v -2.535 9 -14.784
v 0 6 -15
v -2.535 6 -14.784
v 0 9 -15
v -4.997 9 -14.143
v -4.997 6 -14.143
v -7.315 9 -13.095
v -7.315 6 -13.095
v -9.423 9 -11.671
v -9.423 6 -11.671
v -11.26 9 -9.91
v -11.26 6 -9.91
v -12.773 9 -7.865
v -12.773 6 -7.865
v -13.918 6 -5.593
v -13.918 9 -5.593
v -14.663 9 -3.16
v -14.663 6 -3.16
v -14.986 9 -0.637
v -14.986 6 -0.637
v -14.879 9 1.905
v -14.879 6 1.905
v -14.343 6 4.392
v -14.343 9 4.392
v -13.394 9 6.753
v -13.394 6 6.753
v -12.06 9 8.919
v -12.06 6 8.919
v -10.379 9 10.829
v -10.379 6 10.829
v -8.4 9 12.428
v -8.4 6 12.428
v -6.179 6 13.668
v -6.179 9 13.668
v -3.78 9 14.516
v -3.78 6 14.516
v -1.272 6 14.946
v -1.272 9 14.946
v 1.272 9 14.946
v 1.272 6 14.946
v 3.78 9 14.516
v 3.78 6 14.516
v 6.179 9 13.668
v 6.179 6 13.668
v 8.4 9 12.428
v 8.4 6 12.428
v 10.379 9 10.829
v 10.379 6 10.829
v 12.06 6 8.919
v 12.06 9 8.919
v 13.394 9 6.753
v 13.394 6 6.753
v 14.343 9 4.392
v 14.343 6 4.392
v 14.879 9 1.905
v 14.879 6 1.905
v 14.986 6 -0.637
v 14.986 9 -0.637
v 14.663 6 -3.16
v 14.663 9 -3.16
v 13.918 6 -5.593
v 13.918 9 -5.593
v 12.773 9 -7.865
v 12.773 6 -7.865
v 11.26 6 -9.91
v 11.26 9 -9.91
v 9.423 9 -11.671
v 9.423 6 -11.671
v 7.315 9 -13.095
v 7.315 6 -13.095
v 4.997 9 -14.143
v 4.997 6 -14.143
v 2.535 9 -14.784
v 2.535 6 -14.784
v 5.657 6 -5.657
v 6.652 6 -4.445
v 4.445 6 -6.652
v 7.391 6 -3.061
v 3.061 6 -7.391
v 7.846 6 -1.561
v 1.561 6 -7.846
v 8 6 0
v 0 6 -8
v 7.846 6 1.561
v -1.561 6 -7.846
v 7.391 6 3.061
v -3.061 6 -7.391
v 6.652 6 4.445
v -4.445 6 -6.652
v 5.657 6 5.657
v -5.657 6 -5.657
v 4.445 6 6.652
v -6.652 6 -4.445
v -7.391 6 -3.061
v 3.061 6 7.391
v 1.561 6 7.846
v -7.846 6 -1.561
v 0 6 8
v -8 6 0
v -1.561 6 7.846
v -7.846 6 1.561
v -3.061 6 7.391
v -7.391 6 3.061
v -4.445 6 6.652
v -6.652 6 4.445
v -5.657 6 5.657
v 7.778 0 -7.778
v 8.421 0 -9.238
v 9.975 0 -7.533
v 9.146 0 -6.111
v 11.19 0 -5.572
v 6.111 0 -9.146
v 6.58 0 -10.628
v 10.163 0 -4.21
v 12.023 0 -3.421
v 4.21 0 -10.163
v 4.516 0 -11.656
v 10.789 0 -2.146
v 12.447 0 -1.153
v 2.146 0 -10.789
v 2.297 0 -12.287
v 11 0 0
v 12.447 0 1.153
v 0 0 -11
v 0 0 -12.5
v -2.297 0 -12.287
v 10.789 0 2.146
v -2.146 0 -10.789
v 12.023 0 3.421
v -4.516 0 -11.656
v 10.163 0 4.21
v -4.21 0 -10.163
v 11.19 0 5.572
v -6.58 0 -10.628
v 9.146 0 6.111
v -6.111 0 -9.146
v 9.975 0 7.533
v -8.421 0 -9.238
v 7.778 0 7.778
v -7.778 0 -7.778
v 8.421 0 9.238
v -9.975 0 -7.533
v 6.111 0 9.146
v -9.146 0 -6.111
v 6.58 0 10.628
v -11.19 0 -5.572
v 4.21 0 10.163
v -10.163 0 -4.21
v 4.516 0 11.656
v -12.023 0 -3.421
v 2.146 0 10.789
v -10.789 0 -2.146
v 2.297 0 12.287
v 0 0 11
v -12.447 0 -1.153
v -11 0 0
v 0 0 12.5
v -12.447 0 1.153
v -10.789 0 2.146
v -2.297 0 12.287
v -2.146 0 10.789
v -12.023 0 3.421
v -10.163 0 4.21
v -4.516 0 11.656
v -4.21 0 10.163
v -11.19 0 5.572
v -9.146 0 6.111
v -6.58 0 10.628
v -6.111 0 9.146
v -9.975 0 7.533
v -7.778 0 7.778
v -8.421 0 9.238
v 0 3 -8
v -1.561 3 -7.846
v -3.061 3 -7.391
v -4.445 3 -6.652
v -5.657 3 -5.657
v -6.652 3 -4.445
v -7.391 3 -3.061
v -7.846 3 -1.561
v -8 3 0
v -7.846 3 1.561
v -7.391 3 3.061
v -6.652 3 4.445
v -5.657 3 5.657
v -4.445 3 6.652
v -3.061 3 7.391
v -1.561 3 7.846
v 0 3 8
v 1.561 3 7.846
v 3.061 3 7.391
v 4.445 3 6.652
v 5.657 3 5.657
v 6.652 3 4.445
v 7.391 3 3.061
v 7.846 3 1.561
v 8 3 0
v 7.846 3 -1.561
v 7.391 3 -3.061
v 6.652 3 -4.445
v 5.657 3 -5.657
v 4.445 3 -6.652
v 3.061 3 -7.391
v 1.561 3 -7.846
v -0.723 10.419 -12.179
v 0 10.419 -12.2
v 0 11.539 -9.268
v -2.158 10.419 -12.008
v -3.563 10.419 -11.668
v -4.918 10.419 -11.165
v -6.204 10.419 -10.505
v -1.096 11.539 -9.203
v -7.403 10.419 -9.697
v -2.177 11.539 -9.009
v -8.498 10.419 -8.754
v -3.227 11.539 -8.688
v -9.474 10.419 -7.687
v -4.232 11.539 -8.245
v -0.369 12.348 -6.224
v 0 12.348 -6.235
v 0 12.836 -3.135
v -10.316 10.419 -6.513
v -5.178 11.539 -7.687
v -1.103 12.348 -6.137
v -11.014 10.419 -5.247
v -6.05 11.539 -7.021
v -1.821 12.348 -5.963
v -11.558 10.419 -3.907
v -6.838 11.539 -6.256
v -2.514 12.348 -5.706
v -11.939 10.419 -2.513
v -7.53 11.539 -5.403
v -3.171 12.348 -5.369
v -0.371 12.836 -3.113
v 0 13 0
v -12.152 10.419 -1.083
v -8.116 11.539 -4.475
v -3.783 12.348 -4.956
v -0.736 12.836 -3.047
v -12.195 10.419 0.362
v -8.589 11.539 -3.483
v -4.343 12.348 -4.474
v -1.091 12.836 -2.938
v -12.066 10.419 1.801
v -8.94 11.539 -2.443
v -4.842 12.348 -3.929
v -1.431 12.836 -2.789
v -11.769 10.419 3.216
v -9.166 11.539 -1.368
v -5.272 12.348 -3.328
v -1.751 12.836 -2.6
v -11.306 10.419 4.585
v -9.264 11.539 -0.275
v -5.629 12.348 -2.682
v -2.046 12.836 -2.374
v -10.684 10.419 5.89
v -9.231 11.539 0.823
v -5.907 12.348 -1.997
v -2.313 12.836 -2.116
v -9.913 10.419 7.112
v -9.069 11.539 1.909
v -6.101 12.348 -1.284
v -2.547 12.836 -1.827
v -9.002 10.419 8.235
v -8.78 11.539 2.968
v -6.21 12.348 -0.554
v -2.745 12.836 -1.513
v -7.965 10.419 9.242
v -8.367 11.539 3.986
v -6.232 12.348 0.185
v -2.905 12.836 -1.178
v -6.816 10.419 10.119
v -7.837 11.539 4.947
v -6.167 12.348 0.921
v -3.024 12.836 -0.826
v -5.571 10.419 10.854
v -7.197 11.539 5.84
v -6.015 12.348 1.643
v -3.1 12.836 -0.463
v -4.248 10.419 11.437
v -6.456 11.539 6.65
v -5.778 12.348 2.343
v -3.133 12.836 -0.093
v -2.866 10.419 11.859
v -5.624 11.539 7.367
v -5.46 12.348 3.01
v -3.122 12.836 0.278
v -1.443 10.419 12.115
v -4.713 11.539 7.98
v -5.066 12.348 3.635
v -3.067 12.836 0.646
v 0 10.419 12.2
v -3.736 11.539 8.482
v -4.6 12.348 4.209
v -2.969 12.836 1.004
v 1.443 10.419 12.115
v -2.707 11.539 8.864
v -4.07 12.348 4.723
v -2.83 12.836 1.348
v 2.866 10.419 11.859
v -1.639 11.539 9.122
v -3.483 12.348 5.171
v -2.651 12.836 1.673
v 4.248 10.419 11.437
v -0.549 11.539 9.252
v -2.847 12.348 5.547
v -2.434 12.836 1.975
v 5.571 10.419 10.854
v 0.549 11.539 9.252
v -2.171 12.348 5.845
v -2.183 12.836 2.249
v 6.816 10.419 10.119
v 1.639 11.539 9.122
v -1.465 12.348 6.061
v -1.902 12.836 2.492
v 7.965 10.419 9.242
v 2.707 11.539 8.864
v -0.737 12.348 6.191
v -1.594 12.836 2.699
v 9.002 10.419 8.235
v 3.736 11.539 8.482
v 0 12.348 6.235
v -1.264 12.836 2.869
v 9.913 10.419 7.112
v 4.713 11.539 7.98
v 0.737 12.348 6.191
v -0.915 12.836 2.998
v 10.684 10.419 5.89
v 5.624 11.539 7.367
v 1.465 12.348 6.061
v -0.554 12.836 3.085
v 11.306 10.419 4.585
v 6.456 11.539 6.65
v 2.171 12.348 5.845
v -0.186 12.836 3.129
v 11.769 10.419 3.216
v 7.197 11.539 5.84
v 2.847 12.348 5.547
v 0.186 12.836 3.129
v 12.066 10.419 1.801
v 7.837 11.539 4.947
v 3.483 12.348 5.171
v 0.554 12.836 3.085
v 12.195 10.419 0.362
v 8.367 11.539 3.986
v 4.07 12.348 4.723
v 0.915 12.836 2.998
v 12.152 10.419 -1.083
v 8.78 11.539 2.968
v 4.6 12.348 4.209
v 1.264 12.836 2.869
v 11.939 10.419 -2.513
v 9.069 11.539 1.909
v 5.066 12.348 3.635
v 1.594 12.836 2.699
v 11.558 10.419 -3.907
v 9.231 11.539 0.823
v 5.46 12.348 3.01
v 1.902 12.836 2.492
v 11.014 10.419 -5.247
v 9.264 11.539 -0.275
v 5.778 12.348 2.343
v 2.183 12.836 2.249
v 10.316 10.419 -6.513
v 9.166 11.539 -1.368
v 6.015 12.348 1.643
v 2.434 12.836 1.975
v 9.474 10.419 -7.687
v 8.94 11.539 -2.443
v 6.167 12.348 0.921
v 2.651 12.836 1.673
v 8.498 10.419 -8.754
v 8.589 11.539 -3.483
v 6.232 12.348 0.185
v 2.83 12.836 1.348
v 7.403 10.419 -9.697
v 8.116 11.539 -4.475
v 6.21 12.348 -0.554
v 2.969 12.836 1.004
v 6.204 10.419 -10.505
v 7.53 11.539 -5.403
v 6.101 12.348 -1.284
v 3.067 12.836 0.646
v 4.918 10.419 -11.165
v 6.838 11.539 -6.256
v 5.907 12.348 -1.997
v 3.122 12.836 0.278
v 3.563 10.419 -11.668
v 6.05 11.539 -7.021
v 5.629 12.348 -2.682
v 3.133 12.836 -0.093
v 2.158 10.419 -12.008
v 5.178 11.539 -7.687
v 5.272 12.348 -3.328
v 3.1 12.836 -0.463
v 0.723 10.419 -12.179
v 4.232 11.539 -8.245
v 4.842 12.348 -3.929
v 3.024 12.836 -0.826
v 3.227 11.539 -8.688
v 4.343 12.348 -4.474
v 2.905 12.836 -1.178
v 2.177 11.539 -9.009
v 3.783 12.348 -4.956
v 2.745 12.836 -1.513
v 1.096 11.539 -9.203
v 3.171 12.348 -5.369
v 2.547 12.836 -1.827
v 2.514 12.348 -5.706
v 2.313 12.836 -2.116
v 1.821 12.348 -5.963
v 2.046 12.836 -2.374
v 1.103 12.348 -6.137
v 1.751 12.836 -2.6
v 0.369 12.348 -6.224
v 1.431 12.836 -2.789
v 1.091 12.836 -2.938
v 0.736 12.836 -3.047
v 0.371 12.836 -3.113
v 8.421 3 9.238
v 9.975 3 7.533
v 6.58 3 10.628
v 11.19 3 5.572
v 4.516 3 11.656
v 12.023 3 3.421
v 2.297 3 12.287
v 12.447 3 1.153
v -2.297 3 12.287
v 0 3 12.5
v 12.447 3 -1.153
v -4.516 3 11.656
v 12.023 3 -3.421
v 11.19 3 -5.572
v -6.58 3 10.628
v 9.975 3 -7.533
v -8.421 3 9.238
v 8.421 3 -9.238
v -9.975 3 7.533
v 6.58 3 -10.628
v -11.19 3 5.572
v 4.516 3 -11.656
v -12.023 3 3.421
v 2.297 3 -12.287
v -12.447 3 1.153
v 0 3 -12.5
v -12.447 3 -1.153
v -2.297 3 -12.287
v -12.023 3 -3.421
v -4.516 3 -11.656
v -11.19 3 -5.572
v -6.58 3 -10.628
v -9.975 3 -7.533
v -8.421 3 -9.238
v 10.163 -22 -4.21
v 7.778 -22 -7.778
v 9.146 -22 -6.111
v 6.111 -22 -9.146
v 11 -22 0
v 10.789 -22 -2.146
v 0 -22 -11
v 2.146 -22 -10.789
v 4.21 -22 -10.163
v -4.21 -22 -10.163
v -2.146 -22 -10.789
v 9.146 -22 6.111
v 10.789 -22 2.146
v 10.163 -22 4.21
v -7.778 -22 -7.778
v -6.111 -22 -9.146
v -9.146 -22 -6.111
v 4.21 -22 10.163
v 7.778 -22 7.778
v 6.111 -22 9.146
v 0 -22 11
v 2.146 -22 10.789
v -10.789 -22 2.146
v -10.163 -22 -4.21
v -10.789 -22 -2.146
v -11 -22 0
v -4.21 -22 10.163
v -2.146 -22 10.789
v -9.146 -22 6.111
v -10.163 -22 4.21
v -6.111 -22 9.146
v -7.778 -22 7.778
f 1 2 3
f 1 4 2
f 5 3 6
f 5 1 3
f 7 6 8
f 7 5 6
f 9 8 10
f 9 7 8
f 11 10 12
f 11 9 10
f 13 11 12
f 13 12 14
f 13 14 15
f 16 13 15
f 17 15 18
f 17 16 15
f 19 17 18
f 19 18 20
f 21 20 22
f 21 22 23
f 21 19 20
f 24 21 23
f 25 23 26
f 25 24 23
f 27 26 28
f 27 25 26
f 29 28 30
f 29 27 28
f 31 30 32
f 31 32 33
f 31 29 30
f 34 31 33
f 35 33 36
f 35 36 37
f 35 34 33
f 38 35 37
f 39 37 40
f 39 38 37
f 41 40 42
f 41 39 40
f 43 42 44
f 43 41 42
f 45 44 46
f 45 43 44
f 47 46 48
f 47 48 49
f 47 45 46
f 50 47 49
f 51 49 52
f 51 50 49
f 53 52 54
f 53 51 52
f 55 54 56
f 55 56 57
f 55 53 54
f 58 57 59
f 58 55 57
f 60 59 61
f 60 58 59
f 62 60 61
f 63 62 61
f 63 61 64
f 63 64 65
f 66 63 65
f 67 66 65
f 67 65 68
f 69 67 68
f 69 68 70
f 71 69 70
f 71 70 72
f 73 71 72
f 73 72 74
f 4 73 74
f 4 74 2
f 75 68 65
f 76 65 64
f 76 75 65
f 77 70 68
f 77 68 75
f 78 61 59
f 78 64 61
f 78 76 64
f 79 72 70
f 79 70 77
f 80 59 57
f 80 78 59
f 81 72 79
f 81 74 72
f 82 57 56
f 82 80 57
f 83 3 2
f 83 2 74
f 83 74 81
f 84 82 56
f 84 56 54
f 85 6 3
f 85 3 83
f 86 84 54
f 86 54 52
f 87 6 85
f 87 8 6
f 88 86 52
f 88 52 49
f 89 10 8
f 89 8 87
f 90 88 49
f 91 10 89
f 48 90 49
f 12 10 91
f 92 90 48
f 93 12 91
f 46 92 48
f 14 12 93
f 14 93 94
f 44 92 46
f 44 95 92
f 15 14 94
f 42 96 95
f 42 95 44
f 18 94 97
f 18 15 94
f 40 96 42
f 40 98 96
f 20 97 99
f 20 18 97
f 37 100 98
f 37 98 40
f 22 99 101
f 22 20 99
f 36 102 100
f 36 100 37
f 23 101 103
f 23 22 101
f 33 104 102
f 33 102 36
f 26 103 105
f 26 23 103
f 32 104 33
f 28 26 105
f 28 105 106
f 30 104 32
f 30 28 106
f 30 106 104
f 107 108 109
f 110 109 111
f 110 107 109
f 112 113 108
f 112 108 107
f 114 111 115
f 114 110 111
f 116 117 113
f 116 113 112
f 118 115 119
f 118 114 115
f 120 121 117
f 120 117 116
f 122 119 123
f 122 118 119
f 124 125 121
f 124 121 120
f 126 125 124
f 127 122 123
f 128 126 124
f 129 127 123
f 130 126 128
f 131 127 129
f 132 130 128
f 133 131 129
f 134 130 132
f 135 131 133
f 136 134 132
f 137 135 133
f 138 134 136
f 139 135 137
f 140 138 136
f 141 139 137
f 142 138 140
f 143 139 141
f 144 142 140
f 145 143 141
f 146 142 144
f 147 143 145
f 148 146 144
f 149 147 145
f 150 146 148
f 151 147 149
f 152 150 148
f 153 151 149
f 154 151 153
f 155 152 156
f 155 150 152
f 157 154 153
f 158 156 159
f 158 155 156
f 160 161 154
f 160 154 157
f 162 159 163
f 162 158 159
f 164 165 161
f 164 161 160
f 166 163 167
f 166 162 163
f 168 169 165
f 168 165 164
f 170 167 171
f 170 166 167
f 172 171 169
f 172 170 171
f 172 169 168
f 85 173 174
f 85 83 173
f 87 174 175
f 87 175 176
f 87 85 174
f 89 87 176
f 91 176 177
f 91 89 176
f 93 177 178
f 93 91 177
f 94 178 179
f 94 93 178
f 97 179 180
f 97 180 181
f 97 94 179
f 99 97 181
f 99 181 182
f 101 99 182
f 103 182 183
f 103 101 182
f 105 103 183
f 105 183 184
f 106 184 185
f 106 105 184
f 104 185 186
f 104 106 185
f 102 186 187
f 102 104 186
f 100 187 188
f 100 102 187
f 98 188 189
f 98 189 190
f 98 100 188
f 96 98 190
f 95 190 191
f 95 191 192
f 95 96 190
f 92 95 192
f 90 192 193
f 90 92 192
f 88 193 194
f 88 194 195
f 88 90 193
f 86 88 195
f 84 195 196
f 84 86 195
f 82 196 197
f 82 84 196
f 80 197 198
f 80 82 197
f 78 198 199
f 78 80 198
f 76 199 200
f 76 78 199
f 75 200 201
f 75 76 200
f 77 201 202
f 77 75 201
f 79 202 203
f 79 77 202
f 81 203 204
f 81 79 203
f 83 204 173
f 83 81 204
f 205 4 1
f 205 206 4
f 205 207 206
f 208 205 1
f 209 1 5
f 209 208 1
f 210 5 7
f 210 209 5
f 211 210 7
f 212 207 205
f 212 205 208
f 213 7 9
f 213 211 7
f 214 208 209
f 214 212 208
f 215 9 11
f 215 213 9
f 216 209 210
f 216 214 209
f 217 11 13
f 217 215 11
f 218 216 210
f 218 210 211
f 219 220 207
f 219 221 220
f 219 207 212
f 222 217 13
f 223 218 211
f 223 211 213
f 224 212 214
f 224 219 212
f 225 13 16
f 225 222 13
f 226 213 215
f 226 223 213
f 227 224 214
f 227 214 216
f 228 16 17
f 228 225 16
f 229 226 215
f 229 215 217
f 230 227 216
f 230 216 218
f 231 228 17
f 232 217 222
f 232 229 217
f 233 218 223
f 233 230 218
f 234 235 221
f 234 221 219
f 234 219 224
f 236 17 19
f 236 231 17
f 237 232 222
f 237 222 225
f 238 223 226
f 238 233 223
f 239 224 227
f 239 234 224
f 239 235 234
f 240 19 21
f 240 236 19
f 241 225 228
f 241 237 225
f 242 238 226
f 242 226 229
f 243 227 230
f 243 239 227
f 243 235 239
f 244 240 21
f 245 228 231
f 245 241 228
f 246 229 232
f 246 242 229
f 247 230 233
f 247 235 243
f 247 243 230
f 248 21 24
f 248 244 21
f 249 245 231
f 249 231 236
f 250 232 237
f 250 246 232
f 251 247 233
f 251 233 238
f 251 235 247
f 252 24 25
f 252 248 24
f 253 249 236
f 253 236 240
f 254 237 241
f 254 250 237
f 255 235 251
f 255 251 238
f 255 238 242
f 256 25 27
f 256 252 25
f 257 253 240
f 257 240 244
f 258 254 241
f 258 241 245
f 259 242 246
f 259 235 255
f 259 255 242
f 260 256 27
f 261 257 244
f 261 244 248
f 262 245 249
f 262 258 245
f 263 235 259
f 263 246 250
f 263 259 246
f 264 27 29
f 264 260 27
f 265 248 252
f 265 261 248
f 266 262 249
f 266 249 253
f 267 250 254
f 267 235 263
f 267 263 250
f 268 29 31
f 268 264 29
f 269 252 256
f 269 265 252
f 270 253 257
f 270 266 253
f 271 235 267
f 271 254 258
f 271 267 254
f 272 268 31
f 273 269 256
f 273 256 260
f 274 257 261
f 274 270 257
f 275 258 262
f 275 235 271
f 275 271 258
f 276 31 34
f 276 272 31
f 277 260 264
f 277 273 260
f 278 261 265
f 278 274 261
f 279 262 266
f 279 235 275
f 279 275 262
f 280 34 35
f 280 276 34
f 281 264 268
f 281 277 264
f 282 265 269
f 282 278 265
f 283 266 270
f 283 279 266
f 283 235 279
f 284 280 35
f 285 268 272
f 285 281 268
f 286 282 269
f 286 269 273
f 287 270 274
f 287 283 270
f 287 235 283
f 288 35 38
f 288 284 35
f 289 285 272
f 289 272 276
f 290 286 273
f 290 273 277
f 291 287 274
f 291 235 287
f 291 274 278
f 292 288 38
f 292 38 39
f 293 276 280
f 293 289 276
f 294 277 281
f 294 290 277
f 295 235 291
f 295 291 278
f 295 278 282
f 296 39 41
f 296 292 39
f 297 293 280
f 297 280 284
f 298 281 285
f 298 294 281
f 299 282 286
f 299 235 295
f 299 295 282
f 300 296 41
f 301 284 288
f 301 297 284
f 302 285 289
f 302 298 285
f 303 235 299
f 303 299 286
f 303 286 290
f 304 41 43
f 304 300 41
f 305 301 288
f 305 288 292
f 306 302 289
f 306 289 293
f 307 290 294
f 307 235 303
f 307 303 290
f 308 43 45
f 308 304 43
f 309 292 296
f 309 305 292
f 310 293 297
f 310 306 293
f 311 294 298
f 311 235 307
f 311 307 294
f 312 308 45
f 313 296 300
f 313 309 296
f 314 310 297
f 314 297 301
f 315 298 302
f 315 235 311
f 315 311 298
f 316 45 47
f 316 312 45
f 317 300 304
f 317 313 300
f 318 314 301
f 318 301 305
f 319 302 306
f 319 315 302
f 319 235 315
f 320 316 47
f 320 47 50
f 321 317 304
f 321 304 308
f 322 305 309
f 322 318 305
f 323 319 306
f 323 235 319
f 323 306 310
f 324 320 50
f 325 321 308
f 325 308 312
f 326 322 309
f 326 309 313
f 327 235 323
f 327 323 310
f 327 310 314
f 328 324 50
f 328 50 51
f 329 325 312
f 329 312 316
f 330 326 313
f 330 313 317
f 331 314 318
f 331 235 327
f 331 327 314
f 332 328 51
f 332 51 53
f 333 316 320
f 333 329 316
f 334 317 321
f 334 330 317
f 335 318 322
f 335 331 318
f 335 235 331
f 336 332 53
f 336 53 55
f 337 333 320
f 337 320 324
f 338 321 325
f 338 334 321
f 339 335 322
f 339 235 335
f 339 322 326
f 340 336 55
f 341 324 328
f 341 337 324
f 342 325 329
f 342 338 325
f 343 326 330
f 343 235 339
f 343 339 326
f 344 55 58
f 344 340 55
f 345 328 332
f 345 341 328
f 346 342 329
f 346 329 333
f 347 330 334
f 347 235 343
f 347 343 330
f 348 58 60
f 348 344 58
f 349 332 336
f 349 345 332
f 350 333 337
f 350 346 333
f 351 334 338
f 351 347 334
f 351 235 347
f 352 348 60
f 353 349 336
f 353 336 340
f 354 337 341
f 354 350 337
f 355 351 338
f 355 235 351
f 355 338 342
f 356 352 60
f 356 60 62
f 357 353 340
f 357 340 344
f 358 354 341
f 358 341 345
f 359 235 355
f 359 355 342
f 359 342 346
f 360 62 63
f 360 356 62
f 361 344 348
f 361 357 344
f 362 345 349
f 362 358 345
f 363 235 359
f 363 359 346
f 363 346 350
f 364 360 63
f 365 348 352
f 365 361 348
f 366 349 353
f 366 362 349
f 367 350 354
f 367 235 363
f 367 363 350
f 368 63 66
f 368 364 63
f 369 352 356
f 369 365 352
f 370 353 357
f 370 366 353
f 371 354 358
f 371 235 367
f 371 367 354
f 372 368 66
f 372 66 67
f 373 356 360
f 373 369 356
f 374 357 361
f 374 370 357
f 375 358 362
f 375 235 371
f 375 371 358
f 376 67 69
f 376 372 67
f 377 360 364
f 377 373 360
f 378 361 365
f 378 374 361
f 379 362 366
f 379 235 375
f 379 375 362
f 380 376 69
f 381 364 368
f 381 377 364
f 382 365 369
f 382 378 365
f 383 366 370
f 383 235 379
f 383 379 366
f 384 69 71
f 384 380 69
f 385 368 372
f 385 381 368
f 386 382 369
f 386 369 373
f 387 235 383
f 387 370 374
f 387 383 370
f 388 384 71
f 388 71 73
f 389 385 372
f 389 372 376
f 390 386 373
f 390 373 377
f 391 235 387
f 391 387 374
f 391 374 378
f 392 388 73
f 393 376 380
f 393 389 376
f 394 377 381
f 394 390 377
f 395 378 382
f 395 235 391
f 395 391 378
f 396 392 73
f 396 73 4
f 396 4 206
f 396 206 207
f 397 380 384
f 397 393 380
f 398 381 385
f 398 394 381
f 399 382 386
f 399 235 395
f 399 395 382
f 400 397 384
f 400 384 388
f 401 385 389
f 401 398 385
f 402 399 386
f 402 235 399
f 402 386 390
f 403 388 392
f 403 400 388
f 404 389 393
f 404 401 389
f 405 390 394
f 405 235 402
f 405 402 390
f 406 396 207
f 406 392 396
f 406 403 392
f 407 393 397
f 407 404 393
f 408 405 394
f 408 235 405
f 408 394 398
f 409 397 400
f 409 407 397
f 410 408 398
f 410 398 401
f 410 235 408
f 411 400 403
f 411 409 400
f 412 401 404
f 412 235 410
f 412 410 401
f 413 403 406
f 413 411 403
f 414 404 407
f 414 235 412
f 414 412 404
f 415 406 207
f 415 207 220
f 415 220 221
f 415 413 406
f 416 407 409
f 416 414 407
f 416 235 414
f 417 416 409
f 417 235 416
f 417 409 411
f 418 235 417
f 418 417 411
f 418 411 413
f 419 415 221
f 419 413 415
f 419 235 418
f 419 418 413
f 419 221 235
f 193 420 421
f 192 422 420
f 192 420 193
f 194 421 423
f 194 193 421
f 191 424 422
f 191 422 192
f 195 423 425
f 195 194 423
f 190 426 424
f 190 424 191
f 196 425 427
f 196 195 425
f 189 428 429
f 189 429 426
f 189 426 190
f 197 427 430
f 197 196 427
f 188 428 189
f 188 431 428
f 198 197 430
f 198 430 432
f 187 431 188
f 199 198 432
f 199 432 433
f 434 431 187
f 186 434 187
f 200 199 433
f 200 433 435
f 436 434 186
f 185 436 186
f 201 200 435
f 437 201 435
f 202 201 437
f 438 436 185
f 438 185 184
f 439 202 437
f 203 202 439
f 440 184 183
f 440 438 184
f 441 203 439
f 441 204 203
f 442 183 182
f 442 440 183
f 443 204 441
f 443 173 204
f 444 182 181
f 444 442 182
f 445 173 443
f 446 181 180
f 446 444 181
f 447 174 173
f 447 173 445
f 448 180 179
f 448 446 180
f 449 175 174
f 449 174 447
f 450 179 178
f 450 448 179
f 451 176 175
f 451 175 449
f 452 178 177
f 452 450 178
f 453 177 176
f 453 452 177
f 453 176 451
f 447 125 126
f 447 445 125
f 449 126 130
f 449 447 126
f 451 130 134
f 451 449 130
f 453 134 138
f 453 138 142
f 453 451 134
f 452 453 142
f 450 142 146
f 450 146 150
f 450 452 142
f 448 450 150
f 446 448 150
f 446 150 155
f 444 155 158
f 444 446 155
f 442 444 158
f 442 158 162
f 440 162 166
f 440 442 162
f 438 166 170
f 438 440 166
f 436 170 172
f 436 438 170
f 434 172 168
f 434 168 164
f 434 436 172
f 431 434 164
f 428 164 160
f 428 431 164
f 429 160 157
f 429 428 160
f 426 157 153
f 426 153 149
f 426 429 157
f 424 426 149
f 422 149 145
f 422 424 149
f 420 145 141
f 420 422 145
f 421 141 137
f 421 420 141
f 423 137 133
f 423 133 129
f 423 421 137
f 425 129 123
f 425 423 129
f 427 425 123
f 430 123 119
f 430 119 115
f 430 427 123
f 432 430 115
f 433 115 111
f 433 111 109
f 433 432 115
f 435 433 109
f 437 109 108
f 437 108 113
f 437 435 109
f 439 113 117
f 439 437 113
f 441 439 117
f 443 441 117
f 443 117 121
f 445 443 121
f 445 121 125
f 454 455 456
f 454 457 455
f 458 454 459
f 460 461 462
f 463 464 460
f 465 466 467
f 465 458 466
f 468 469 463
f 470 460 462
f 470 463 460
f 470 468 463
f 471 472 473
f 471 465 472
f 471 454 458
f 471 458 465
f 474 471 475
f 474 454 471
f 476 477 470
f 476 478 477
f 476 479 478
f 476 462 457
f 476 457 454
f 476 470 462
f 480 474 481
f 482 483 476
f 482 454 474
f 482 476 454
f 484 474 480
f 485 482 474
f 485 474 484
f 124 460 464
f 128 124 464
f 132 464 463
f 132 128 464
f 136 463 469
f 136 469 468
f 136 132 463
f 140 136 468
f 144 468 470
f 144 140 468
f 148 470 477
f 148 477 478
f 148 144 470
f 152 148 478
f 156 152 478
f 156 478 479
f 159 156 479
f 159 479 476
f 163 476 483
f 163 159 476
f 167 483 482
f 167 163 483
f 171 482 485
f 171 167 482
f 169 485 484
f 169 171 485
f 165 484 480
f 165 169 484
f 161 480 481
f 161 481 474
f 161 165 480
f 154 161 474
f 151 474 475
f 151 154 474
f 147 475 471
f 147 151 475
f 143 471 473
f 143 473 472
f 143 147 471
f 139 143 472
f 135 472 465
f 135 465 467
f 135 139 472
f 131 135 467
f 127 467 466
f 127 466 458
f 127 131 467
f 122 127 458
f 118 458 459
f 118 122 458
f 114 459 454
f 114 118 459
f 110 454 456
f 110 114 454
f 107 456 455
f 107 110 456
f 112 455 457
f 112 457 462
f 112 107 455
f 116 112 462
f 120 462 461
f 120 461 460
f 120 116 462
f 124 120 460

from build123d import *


with BuildPart() as part:
    # Sketch1 → Revolve1 (revolve)
    with BuildSketch(Plane(origin=(0, 0, 0), x_dir=(0, 0, -1), z_dir=(1, 0, 0))):
        with BuildLine():
            Line((0, 0), (0, -22))
            Line((0, -22), (11, -22))
            Line((11, -22), (11, 0))
            Line((11, 0), (12.5, 0))
            Line((12.5, 0), (12.5, 3))
            Line((12.5, 3), (8, 3))
            Line((8, 3), (8, 6))
            Line((8, 6), (15, 6))
            Line((15, 6), (15, 9))
            ThreePointArc((15, 9), (7.762087348, 11.982827555), (0, 13))
            Line((0, 13), (0, 0))
        make_face()
    revolve(axis=Axis((0, 0, 0), (0, 1, 0)))


solid = part.part
